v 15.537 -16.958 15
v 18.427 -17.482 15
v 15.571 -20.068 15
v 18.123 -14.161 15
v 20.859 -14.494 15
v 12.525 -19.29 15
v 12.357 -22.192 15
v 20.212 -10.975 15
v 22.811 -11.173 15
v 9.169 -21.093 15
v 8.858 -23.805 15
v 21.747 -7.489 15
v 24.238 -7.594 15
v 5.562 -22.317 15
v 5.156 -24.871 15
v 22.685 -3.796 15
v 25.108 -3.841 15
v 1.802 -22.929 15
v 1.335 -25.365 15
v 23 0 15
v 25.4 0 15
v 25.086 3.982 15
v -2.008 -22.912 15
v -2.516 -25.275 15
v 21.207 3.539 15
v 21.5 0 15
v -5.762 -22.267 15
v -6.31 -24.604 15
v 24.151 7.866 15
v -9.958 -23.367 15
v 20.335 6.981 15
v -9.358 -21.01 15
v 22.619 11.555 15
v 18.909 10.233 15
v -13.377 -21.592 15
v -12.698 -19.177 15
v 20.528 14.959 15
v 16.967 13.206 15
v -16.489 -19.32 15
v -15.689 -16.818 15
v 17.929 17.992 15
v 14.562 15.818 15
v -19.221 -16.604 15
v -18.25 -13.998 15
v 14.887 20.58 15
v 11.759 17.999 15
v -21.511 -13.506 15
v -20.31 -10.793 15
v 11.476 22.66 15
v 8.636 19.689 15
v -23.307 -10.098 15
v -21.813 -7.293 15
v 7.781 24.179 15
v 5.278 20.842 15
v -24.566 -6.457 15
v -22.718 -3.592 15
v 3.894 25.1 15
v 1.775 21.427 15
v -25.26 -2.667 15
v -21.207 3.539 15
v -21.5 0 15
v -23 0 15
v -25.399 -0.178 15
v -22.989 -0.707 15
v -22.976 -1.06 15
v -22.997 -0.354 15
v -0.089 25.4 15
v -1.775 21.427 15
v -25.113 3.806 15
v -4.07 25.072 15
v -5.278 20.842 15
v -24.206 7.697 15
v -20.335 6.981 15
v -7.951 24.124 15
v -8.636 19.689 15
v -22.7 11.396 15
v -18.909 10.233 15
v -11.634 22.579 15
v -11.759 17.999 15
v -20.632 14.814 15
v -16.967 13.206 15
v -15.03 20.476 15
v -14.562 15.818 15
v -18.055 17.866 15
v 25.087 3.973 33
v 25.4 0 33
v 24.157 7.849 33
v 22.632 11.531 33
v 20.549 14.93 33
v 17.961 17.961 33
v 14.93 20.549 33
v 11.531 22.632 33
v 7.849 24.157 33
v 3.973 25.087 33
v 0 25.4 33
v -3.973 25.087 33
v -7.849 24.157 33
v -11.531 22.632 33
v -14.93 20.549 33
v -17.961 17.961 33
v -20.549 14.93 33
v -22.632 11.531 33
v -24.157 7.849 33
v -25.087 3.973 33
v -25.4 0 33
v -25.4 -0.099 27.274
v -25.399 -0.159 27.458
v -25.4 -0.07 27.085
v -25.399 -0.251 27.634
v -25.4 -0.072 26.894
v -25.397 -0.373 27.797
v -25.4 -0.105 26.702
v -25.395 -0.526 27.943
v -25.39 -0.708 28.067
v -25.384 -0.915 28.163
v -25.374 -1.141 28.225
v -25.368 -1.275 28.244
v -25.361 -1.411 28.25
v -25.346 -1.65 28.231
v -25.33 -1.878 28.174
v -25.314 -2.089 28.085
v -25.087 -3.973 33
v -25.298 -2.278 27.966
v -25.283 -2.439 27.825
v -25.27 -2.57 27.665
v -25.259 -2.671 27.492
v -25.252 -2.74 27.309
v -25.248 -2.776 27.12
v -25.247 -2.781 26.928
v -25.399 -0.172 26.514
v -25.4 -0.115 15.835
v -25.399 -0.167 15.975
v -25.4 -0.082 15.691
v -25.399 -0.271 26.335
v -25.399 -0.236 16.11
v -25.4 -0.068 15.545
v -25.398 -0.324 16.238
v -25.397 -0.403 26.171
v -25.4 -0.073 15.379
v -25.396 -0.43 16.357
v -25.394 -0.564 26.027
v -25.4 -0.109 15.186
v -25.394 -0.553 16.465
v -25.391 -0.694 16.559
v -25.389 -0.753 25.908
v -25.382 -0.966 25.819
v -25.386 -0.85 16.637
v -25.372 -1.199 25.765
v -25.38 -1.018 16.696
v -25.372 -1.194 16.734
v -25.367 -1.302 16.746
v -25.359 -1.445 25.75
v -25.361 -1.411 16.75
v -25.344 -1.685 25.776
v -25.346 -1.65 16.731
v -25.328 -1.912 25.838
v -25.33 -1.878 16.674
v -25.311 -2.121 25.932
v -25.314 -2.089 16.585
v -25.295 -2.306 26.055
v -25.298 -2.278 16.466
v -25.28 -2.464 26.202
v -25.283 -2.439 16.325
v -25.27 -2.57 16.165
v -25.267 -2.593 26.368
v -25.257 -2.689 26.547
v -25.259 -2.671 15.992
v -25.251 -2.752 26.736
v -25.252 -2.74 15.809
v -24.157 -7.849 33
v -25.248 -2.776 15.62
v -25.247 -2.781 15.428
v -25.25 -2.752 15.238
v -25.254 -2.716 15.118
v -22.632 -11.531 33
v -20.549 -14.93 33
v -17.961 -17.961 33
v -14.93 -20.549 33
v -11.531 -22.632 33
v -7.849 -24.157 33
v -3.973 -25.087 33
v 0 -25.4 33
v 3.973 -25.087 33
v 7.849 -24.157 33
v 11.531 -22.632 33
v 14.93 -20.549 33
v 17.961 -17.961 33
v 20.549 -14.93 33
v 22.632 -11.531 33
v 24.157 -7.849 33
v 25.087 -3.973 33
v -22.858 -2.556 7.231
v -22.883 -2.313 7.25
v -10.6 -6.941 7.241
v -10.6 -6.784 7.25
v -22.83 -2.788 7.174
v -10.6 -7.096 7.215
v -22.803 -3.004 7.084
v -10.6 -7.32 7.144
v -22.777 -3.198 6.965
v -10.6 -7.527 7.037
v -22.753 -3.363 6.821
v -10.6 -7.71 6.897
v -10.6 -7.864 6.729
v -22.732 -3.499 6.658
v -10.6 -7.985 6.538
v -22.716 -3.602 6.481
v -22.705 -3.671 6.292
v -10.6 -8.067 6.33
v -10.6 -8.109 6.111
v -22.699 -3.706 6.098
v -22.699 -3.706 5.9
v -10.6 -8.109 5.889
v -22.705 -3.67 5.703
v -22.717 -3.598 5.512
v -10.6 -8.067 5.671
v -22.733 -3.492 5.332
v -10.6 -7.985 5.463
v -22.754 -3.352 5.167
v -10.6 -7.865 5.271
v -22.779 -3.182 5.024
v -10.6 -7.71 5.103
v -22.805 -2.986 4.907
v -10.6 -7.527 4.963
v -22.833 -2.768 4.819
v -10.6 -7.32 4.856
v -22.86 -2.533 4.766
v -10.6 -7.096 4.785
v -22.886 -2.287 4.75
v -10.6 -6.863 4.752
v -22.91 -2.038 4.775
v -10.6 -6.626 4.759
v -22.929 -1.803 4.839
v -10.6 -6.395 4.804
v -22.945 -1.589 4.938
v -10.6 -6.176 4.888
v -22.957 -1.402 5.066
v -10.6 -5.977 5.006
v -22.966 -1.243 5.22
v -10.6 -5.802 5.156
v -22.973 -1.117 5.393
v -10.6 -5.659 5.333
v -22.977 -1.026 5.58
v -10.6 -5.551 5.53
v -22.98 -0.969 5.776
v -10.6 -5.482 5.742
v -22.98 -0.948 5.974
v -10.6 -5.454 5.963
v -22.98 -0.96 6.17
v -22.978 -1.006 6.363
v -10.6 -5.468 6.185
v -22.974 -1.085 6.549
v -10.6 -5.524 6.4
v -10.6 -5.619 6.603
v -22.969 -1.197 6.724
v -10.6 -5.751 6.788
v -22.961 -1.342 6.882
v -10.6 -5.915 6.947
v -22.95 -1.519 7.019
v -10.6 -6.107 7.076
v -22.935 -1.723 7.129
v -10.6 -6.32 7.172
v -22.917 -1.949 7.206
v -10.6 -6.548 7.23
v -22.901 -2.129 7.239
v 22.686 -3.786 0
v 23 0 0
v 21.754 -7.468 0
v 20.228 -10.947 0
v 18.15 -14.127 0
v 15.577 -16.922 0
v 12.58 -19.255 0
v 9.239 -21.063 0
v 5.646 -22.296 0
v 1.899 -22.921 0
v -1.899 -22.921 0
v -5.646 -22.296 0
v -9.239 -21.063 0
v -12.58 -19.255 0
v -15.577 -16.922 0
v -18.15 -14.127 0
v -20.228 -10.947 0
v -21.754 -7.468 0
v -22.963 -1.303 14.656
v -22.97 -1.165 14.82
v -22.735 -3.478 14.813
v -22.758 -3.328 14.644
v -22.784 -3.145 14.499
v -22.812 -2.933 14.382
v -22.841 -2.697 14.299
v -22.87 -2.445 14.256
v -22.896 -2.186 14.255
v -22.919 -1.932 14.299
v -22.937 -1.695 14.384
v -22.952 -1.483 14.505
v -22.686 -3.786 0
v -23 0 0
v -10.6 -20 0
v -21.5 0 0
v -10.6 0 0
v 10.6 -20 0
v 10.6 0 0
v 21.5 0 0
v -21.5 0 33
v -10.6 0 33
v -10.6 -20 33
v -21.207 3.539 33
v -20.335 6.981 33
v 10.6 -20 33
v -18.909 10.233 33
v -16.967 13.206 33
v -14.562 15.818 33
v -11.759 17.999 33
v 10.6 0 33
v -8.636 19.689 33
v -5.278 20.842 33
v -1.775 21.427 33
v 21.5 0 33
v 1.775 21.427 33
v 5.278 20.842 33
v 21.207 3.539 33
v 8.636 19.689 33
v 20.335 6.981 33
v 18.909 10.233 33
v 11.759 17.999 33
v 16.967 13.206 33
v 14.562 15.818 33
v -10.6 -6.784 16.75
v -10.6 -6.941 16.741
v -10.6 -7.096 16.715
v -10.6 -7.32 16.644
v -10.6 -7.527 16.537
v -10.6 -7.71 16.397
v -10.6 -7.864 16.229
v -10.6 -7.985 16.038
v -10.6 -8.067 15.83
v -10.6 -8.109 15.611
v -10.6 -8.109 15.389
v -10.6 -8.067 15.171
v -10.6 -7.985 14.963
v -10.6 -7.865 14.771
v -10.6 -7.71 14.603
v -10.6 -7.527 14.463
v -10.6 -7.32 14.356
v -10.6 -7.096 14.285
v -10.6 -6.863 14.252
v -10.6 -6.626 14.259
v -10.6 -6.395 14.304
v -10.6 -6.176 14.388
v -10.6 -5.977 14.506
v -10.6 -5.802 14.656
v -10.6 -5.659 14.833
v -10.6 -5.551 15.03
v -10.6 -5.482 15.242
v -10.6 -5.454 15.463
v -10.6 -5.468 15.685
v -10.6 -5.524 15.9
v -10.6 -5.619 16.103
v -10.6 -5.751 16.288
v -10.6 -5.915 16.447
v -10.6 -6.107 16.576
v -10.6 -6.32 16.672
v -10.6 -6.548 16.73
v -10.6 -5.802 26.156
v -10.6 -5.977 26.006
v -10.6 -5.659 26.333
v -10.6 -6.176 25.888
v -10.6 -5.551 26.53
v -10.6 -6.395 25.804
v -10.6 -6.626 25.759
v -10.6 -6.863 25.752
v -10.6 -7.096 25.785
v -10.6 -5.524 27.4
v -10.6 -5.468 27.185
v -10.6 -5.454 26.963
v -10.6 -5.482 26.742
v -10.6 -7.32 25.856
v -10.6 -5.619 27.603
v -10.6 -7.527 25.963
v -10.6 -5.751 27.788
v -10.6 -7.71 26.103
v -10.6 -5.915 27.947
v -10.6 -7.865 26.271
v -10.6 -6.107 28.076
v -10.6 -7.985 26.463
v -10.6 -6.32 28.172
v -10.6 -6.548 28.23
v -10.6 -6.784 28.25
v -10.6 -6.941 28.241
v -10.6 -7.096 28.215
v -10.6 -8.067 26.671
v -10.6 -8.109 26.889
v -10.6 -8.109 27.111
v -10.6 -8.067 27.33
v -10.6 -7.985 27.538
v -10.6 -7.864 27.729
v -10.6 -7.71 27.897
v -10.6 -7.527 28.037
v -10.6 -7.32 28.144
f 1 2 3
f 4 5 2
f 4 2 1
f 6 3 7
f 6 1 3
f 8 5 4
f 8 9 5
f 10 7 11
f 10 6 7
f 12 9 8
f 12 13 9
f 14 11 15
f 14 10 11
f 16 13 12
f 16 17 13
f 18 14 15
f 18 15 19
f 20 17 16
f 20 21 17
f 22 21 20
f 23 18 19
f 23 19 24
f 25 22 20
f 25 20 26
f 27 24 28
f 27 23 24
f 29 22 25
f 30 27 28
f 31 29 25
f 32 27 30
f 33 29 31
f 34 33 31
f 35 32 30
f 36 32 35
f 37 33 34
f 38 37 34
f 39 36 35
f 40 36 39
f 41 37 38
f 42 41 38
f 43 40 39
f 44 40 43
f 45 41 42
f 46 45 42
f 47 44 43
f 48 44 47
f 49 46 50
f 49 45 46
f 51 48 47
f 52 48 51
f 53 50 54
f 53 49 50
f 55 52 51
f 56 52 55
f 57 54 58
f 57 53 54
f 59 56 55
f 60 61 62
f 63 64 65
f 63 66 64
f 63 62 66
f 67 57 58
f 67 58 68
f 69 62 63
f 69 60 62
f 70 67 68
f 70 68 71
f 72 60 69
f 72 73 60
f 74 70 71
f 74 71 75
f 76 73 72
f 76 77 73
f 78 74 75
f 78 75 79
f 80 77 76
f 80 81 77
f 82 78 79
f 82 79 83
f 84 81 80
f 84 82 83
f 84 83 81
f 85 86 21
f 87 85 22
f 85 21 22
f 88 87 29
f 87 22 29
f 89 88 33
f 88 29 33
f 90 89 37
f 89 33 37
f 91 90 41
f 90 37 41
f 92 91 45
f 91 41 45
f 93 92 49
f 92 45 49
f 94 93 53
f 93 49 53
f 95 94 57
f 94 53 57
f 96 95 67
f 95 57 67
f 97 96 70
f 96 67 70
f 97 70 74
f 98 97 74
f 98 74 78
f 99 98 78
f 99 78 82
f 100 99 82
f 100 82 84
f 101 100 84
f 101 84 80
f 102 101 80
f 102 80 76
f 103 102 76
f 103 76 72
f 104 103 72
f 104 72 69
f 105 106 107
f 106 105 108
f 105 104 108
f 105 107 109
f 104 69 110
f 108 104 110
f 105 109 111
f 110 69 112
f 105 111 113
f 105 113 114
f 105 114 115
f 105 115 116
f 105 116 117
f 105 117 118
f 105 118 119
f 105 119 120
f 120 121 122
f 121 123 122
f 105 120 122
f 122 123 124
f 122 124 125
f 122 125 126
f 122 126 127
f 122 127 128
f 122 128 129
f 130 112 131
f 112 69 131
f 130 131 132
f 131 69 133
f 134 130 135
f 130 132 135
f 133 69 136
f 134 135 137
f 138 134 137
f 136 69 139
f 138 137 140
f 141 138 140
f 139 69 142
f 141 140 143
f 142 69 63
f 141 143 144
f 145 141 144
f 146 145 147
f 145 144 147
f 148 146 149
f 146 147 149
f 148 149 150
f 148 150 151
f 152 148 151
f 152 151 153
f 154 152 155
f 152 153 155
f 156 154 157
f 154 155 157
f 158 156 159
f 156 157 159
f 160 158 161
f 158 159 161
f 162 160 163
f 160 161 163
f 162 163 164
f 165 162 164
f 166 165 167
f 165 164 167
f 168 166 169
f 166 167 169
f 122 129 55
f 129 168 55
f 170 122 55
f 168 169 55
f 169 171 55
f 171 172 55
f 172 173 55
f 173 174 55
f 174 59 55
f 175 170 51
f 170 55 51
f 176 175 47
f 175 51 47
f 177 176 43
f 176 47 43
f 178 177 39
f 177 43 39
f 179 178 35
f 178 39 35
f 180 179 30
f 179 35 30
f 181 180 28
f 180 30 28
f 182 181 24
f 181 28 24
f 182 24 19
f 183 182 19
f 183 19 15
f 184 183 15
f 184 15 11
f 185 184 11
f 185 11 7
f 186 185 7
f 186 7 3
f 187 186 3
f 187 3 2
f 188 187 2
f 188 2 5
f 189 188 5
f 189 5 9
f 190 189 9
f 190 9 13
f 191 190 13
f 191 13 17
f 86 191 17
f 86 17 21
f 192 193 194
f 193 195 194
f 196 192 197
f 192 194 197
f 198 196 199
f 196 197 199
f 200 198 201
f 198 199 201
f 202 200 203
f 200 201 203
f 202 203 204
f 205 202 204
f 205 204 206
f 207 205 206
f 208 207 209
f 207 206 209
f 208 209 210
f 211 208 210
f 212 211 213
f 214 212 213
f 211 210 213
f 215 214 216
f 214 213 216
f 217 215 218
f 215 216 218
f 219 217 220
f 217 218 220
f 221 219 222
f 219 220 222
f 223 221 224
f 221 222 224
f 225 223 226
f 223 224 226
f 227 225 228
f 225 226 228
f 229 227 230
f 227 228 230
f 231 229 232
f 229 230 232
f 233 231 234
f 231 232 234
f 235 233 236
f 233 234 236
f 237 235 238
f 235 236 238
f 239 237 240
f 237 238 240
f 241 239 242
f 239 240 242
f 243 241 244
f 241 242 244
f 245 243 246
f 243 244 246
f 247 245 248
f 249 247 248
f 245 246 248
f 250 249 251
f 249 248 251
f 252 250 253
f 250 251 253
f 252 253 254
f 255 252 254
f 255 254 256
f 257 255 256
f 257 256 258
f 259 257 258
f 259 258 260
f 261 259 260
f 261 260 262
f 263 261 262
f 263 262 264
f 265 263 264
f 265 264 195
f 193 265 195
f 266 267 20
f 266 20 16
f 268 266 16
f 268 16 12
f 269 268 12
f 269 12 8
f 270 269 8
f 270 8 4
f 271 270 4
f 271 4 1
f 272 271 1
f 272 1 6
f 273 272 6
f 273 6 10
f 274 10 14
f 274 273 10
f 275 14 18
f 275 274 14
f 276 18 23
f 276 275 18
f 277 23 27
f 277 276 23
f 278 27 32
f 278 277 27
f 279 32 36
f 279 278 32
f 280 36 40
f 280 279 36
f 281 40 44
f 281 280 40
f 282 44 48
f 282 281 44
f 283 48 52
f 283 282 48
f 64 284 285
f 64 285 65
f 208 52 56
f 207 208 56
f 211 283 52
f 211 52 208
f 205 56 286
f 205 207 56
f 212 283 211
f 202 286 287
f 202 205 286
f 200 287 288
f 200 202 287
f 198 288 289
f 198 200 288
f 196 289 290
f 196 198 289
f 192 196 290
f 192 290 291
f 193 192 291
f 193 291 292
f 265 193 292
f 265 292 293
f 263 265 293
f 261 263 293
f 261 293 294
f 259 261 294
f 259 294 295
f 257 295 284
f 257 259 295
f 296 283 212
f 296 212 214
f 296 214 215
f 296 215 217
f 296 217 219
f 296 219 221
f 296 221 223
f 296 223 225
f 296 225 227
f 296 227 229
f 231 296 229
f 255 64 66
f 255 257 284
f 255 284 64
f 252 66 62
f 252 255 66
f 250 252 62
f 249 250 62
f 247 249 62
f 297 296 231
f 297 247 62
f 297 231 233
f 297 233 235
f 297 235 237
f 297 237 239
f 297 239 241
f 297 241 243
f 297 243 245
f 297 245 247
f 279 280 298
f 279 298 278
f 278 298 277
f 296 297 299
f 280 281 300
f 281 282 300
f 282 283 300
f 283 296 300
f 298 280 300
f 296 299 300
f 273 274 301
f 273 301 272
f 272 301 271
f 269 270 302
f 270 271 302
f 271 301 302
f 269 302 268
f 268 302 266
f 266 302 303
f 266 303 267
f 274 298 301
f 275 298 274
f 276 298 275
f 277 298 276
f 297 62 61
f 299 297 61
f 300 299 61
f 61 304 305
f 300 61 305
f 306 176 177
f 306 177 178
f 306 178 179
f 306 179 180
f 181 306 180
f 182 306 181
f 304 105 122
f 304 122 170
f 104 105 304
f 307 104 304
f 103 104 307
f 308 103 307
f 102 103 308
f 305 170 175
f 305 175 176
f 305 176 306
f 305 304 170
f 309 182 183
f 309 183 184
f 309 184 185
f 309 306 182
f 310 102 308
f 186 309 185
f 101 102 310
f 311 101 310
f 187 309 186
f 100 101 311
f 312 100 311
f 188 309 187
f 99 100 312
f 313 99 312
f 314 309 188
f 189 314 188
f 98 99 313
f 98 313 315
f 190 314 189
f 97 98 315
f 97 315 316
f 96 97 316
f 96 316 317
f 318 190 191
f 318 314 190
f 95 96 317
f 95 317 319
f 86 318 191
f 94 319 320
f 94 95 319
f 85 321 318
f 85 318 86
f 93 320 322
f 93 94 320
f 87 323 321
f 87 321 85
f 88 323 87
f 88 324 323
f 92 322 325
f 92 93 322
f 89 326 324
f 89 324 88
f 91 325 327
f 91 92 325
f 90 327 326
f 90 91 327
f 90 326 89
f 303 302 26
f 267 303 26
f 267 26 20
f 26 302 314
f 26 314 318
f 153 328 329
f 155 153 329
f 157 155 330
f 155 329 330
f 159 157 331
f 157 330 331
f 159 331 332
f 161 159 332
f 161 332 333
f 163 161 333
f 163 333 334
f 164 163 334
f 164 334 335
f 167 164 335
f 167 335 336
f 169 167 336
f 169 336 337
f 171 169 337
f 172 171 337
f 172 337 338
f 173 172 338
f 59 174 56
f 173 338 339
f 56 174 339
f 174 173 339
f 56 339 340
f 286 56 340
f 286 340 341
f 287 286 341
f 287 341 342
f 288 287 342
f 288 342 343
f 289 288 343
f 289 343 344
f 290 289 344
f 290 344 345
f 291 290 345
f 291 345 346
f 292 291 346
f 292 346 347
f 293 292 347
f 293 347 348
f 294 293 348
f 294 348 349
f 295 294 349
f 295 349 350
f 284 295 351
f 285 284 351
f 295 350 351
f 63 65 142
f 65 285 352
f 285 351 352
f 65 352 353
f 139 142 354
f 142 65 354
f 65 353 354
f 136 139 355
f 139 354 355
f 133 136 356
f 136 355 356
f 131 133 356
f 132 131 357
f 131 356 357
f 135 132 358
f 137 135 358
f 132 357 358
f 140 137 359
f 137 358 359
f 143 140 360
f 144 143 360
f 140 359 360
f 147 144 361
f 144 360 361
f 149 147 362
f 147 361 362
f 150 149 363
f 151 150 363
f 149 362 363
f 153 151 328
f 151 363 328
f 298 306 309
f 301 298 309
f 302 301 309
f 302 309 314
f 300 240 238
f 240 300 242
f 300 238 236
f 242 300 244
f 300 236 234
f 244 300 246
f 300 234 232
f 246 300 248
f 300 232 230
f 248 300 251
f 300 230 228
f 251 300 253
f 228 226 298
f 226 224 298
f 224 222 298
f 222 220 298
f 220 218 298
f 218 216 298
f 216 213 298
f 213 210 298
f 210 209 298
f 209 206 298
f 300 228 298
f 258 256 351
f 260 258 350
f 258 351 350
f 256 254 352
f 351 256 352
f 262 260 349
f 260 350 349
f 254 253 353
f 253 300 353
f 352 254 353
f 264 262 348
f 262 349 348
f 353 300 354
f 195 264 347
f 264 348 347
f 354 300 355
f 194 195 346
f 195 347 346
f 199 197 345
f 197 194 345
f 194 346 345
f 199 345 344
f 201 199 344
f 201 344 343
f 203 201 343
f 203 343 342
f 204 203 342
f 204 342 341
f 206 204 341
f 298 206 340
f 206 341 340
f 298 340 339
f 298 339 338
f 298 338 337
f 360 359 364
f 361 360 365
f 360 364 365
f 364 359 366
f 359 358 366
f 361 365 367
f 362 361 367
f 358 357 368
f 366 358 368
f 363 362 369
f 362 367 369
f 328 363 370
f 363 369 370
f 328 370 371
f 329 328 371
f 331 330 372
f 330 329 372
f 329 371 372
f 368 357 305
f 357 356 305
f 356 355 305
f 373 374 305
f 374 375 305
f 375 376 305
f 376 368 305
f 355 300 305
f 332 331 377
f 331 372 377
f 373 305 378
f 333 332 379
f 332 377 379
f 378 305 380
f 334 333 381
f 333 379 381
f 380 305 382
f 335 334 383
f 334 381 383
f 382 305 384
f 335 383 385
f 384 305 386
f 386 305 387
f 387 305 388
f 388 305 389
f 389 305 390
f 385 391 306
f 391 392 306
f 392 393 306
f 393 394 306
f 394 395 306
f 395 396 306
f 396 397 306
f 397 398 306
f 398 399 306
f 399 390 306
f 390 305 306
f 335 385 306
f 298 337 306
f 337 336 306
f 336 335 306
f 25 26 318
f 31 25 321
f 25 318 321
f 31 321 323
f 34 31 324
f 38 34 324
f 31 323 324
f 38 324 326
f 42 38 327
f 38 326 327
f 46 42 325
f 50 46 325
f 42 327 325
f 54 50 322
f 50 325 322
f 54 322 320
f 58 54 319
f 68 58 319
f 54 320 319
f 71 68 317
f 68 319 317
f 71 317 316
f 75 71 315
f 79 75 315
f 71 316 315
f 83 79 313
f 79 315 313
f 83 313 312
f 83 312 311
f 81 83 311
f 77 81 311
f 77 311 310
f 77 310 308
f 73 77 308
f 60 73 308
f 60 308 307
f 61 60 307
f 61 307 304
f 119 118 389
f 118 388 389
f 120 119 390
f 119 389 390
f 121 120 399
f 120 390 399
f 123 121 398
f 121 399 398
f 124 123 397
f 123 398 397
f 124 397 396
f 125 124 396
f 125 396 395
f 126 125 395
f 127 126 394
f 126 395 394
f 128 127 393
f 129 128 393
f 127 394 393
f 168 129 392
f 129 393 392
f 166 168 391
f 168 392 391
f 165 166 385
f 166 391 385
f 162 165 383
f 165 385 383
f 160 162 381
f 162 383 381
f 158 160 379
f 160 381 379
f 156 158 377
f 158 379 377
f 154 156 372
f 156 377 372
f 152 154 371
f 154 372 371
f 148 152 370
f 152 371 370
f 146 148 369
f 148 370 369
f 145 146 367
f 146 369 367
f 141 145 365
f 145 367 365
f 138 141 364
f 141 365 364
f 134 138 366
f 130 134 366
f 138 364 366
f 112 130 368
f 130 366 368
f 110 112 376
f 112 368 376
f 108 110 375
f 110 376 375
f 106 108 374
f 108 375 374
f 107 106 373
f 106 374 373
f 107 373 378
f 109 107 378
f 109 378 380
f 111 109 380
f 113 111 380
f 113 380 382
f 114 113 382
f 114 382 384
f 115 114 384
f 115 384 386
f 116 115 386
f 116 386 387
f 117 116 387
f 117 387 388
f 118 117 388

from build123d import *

# Parameters (mm, degrees)
SKETCH1_R                       = 25.4
BOSS_EXTRUDE1_DEPTH             = 33
CUT_EXTRUDE1_DEPTH              = 34
SKETCH3_R                       = 25.4
SKETCH3_R_2                     = 23
CUT_EXTRUDE2_DEPTH              = 15
M3X0_5_TAPPED_HOLE1_D           = 2.5
M3X0_5_TAPPED_HOLE1_DEPTH       = 25
M3X0_5_TAPPED_HOLE1_CSINK_D     = 3.05
M3X0_5_TAPPED_HOLE1_CSINK_ANGLE = 90
M3X0_5_TAPPED_HOLE1_TIP         = 0.751075774
SKETCH6_W                       = 55.513598287
SKETCH6_H                       = 26.495126455
CUT_EXTRUDE3_DEPTH              = 15


with BuildPart() as part:
    # Sketch1 → Boss-Extrude1 (new body)
    with BuildSketch(Plane.XY):
        Circle(SKETCH1_R)
    extrude(amount=BOSS_EXTRUDE1_DEPTH)

    # Sketch2 → Cut-Extrude1 (cut, through all)
    with BuildSketch(Plane.XY.offset(33)):
        with BuildLine():
            Line((-21.5, 0), (-10.6, 0))
            Line((-10.6, 0), (-10.6, -20))
            Line((-10.6, -20), (10.6, -20))
            Line((10.6, -20), (10.6, 0))
            Line((10.6, 0), (21.5, 0))
            ThreePointArc((21.5, 0), (0, 21.5), (-21.5, 0))
        make_face()
    extrude(amount=-CUT_EXTRUDE1_DEPTH, mode=Mode.SUBTRACT)

    # Sketch3 → Cut-Extrude2 (cut)
    with BuildSketch(Plane(origin=(0, 0, 0), x_dir=(-1, 0, 0), z_dir=(0, 0, -1))):
        Circle(SKETCH3_R)
        Circle(SKETCH3_R_2, mode=Mode.SUBTRACT)
    extrude(amount=-CUT_EXTRUDE2_DEPTH, mode=Mode.SUBTRACT)

    # M3x0.5 Tapped Hole1
    with Locations(Plane(origin=(-23.868192568, 8.68731164, 0), x_dir=(0, 0, -1), z_dir=(-0.939692621, 0.342020143, 0))):
        with Locations((-27, 10), (-15.5, 10), (-6, 10)):
            CounterSinkHole(M3X0_5_TAPPED_HOLE1_D / 2, M3X0_5_TAPPED_HOLE1_CSINK_D / 2, depth=M3X0_5_TAPPED_HOLE1_DEPTH, counter_sink_angle=M3X0_5_TAPPED_HOLE1_CSINK_ANGLE)
            with Locations((0, 0, -(M3X0_5_TAPPED_HOLE1_DEPTH + M3X0_5_TAPPED_HOLE1_TIP / 2))):  # 118° drill point
                Cone(0, M3X0_5_TAPPED_HOLE1_D / 2, M3X0_5_TAPPED_HOLE1_TIP, mode=Mode.SUBTRACT)

    # Sketch6 → Cut-Extrude3 (cut)
    with BuildSketch(Plane(origin=(0, 0, 0), x_dir=(-1, 0, 0), z_dir=(0, 0, -1))):
        with Locations((1.479202462, 13.247563228)):
            Rectangle(SKETCH6_W, SKETCH6_H)
    extrude(amount=-CUT_EXTRUDE3_DEPTH, mode=Mode.SUBTRACT)


solid = part.part
